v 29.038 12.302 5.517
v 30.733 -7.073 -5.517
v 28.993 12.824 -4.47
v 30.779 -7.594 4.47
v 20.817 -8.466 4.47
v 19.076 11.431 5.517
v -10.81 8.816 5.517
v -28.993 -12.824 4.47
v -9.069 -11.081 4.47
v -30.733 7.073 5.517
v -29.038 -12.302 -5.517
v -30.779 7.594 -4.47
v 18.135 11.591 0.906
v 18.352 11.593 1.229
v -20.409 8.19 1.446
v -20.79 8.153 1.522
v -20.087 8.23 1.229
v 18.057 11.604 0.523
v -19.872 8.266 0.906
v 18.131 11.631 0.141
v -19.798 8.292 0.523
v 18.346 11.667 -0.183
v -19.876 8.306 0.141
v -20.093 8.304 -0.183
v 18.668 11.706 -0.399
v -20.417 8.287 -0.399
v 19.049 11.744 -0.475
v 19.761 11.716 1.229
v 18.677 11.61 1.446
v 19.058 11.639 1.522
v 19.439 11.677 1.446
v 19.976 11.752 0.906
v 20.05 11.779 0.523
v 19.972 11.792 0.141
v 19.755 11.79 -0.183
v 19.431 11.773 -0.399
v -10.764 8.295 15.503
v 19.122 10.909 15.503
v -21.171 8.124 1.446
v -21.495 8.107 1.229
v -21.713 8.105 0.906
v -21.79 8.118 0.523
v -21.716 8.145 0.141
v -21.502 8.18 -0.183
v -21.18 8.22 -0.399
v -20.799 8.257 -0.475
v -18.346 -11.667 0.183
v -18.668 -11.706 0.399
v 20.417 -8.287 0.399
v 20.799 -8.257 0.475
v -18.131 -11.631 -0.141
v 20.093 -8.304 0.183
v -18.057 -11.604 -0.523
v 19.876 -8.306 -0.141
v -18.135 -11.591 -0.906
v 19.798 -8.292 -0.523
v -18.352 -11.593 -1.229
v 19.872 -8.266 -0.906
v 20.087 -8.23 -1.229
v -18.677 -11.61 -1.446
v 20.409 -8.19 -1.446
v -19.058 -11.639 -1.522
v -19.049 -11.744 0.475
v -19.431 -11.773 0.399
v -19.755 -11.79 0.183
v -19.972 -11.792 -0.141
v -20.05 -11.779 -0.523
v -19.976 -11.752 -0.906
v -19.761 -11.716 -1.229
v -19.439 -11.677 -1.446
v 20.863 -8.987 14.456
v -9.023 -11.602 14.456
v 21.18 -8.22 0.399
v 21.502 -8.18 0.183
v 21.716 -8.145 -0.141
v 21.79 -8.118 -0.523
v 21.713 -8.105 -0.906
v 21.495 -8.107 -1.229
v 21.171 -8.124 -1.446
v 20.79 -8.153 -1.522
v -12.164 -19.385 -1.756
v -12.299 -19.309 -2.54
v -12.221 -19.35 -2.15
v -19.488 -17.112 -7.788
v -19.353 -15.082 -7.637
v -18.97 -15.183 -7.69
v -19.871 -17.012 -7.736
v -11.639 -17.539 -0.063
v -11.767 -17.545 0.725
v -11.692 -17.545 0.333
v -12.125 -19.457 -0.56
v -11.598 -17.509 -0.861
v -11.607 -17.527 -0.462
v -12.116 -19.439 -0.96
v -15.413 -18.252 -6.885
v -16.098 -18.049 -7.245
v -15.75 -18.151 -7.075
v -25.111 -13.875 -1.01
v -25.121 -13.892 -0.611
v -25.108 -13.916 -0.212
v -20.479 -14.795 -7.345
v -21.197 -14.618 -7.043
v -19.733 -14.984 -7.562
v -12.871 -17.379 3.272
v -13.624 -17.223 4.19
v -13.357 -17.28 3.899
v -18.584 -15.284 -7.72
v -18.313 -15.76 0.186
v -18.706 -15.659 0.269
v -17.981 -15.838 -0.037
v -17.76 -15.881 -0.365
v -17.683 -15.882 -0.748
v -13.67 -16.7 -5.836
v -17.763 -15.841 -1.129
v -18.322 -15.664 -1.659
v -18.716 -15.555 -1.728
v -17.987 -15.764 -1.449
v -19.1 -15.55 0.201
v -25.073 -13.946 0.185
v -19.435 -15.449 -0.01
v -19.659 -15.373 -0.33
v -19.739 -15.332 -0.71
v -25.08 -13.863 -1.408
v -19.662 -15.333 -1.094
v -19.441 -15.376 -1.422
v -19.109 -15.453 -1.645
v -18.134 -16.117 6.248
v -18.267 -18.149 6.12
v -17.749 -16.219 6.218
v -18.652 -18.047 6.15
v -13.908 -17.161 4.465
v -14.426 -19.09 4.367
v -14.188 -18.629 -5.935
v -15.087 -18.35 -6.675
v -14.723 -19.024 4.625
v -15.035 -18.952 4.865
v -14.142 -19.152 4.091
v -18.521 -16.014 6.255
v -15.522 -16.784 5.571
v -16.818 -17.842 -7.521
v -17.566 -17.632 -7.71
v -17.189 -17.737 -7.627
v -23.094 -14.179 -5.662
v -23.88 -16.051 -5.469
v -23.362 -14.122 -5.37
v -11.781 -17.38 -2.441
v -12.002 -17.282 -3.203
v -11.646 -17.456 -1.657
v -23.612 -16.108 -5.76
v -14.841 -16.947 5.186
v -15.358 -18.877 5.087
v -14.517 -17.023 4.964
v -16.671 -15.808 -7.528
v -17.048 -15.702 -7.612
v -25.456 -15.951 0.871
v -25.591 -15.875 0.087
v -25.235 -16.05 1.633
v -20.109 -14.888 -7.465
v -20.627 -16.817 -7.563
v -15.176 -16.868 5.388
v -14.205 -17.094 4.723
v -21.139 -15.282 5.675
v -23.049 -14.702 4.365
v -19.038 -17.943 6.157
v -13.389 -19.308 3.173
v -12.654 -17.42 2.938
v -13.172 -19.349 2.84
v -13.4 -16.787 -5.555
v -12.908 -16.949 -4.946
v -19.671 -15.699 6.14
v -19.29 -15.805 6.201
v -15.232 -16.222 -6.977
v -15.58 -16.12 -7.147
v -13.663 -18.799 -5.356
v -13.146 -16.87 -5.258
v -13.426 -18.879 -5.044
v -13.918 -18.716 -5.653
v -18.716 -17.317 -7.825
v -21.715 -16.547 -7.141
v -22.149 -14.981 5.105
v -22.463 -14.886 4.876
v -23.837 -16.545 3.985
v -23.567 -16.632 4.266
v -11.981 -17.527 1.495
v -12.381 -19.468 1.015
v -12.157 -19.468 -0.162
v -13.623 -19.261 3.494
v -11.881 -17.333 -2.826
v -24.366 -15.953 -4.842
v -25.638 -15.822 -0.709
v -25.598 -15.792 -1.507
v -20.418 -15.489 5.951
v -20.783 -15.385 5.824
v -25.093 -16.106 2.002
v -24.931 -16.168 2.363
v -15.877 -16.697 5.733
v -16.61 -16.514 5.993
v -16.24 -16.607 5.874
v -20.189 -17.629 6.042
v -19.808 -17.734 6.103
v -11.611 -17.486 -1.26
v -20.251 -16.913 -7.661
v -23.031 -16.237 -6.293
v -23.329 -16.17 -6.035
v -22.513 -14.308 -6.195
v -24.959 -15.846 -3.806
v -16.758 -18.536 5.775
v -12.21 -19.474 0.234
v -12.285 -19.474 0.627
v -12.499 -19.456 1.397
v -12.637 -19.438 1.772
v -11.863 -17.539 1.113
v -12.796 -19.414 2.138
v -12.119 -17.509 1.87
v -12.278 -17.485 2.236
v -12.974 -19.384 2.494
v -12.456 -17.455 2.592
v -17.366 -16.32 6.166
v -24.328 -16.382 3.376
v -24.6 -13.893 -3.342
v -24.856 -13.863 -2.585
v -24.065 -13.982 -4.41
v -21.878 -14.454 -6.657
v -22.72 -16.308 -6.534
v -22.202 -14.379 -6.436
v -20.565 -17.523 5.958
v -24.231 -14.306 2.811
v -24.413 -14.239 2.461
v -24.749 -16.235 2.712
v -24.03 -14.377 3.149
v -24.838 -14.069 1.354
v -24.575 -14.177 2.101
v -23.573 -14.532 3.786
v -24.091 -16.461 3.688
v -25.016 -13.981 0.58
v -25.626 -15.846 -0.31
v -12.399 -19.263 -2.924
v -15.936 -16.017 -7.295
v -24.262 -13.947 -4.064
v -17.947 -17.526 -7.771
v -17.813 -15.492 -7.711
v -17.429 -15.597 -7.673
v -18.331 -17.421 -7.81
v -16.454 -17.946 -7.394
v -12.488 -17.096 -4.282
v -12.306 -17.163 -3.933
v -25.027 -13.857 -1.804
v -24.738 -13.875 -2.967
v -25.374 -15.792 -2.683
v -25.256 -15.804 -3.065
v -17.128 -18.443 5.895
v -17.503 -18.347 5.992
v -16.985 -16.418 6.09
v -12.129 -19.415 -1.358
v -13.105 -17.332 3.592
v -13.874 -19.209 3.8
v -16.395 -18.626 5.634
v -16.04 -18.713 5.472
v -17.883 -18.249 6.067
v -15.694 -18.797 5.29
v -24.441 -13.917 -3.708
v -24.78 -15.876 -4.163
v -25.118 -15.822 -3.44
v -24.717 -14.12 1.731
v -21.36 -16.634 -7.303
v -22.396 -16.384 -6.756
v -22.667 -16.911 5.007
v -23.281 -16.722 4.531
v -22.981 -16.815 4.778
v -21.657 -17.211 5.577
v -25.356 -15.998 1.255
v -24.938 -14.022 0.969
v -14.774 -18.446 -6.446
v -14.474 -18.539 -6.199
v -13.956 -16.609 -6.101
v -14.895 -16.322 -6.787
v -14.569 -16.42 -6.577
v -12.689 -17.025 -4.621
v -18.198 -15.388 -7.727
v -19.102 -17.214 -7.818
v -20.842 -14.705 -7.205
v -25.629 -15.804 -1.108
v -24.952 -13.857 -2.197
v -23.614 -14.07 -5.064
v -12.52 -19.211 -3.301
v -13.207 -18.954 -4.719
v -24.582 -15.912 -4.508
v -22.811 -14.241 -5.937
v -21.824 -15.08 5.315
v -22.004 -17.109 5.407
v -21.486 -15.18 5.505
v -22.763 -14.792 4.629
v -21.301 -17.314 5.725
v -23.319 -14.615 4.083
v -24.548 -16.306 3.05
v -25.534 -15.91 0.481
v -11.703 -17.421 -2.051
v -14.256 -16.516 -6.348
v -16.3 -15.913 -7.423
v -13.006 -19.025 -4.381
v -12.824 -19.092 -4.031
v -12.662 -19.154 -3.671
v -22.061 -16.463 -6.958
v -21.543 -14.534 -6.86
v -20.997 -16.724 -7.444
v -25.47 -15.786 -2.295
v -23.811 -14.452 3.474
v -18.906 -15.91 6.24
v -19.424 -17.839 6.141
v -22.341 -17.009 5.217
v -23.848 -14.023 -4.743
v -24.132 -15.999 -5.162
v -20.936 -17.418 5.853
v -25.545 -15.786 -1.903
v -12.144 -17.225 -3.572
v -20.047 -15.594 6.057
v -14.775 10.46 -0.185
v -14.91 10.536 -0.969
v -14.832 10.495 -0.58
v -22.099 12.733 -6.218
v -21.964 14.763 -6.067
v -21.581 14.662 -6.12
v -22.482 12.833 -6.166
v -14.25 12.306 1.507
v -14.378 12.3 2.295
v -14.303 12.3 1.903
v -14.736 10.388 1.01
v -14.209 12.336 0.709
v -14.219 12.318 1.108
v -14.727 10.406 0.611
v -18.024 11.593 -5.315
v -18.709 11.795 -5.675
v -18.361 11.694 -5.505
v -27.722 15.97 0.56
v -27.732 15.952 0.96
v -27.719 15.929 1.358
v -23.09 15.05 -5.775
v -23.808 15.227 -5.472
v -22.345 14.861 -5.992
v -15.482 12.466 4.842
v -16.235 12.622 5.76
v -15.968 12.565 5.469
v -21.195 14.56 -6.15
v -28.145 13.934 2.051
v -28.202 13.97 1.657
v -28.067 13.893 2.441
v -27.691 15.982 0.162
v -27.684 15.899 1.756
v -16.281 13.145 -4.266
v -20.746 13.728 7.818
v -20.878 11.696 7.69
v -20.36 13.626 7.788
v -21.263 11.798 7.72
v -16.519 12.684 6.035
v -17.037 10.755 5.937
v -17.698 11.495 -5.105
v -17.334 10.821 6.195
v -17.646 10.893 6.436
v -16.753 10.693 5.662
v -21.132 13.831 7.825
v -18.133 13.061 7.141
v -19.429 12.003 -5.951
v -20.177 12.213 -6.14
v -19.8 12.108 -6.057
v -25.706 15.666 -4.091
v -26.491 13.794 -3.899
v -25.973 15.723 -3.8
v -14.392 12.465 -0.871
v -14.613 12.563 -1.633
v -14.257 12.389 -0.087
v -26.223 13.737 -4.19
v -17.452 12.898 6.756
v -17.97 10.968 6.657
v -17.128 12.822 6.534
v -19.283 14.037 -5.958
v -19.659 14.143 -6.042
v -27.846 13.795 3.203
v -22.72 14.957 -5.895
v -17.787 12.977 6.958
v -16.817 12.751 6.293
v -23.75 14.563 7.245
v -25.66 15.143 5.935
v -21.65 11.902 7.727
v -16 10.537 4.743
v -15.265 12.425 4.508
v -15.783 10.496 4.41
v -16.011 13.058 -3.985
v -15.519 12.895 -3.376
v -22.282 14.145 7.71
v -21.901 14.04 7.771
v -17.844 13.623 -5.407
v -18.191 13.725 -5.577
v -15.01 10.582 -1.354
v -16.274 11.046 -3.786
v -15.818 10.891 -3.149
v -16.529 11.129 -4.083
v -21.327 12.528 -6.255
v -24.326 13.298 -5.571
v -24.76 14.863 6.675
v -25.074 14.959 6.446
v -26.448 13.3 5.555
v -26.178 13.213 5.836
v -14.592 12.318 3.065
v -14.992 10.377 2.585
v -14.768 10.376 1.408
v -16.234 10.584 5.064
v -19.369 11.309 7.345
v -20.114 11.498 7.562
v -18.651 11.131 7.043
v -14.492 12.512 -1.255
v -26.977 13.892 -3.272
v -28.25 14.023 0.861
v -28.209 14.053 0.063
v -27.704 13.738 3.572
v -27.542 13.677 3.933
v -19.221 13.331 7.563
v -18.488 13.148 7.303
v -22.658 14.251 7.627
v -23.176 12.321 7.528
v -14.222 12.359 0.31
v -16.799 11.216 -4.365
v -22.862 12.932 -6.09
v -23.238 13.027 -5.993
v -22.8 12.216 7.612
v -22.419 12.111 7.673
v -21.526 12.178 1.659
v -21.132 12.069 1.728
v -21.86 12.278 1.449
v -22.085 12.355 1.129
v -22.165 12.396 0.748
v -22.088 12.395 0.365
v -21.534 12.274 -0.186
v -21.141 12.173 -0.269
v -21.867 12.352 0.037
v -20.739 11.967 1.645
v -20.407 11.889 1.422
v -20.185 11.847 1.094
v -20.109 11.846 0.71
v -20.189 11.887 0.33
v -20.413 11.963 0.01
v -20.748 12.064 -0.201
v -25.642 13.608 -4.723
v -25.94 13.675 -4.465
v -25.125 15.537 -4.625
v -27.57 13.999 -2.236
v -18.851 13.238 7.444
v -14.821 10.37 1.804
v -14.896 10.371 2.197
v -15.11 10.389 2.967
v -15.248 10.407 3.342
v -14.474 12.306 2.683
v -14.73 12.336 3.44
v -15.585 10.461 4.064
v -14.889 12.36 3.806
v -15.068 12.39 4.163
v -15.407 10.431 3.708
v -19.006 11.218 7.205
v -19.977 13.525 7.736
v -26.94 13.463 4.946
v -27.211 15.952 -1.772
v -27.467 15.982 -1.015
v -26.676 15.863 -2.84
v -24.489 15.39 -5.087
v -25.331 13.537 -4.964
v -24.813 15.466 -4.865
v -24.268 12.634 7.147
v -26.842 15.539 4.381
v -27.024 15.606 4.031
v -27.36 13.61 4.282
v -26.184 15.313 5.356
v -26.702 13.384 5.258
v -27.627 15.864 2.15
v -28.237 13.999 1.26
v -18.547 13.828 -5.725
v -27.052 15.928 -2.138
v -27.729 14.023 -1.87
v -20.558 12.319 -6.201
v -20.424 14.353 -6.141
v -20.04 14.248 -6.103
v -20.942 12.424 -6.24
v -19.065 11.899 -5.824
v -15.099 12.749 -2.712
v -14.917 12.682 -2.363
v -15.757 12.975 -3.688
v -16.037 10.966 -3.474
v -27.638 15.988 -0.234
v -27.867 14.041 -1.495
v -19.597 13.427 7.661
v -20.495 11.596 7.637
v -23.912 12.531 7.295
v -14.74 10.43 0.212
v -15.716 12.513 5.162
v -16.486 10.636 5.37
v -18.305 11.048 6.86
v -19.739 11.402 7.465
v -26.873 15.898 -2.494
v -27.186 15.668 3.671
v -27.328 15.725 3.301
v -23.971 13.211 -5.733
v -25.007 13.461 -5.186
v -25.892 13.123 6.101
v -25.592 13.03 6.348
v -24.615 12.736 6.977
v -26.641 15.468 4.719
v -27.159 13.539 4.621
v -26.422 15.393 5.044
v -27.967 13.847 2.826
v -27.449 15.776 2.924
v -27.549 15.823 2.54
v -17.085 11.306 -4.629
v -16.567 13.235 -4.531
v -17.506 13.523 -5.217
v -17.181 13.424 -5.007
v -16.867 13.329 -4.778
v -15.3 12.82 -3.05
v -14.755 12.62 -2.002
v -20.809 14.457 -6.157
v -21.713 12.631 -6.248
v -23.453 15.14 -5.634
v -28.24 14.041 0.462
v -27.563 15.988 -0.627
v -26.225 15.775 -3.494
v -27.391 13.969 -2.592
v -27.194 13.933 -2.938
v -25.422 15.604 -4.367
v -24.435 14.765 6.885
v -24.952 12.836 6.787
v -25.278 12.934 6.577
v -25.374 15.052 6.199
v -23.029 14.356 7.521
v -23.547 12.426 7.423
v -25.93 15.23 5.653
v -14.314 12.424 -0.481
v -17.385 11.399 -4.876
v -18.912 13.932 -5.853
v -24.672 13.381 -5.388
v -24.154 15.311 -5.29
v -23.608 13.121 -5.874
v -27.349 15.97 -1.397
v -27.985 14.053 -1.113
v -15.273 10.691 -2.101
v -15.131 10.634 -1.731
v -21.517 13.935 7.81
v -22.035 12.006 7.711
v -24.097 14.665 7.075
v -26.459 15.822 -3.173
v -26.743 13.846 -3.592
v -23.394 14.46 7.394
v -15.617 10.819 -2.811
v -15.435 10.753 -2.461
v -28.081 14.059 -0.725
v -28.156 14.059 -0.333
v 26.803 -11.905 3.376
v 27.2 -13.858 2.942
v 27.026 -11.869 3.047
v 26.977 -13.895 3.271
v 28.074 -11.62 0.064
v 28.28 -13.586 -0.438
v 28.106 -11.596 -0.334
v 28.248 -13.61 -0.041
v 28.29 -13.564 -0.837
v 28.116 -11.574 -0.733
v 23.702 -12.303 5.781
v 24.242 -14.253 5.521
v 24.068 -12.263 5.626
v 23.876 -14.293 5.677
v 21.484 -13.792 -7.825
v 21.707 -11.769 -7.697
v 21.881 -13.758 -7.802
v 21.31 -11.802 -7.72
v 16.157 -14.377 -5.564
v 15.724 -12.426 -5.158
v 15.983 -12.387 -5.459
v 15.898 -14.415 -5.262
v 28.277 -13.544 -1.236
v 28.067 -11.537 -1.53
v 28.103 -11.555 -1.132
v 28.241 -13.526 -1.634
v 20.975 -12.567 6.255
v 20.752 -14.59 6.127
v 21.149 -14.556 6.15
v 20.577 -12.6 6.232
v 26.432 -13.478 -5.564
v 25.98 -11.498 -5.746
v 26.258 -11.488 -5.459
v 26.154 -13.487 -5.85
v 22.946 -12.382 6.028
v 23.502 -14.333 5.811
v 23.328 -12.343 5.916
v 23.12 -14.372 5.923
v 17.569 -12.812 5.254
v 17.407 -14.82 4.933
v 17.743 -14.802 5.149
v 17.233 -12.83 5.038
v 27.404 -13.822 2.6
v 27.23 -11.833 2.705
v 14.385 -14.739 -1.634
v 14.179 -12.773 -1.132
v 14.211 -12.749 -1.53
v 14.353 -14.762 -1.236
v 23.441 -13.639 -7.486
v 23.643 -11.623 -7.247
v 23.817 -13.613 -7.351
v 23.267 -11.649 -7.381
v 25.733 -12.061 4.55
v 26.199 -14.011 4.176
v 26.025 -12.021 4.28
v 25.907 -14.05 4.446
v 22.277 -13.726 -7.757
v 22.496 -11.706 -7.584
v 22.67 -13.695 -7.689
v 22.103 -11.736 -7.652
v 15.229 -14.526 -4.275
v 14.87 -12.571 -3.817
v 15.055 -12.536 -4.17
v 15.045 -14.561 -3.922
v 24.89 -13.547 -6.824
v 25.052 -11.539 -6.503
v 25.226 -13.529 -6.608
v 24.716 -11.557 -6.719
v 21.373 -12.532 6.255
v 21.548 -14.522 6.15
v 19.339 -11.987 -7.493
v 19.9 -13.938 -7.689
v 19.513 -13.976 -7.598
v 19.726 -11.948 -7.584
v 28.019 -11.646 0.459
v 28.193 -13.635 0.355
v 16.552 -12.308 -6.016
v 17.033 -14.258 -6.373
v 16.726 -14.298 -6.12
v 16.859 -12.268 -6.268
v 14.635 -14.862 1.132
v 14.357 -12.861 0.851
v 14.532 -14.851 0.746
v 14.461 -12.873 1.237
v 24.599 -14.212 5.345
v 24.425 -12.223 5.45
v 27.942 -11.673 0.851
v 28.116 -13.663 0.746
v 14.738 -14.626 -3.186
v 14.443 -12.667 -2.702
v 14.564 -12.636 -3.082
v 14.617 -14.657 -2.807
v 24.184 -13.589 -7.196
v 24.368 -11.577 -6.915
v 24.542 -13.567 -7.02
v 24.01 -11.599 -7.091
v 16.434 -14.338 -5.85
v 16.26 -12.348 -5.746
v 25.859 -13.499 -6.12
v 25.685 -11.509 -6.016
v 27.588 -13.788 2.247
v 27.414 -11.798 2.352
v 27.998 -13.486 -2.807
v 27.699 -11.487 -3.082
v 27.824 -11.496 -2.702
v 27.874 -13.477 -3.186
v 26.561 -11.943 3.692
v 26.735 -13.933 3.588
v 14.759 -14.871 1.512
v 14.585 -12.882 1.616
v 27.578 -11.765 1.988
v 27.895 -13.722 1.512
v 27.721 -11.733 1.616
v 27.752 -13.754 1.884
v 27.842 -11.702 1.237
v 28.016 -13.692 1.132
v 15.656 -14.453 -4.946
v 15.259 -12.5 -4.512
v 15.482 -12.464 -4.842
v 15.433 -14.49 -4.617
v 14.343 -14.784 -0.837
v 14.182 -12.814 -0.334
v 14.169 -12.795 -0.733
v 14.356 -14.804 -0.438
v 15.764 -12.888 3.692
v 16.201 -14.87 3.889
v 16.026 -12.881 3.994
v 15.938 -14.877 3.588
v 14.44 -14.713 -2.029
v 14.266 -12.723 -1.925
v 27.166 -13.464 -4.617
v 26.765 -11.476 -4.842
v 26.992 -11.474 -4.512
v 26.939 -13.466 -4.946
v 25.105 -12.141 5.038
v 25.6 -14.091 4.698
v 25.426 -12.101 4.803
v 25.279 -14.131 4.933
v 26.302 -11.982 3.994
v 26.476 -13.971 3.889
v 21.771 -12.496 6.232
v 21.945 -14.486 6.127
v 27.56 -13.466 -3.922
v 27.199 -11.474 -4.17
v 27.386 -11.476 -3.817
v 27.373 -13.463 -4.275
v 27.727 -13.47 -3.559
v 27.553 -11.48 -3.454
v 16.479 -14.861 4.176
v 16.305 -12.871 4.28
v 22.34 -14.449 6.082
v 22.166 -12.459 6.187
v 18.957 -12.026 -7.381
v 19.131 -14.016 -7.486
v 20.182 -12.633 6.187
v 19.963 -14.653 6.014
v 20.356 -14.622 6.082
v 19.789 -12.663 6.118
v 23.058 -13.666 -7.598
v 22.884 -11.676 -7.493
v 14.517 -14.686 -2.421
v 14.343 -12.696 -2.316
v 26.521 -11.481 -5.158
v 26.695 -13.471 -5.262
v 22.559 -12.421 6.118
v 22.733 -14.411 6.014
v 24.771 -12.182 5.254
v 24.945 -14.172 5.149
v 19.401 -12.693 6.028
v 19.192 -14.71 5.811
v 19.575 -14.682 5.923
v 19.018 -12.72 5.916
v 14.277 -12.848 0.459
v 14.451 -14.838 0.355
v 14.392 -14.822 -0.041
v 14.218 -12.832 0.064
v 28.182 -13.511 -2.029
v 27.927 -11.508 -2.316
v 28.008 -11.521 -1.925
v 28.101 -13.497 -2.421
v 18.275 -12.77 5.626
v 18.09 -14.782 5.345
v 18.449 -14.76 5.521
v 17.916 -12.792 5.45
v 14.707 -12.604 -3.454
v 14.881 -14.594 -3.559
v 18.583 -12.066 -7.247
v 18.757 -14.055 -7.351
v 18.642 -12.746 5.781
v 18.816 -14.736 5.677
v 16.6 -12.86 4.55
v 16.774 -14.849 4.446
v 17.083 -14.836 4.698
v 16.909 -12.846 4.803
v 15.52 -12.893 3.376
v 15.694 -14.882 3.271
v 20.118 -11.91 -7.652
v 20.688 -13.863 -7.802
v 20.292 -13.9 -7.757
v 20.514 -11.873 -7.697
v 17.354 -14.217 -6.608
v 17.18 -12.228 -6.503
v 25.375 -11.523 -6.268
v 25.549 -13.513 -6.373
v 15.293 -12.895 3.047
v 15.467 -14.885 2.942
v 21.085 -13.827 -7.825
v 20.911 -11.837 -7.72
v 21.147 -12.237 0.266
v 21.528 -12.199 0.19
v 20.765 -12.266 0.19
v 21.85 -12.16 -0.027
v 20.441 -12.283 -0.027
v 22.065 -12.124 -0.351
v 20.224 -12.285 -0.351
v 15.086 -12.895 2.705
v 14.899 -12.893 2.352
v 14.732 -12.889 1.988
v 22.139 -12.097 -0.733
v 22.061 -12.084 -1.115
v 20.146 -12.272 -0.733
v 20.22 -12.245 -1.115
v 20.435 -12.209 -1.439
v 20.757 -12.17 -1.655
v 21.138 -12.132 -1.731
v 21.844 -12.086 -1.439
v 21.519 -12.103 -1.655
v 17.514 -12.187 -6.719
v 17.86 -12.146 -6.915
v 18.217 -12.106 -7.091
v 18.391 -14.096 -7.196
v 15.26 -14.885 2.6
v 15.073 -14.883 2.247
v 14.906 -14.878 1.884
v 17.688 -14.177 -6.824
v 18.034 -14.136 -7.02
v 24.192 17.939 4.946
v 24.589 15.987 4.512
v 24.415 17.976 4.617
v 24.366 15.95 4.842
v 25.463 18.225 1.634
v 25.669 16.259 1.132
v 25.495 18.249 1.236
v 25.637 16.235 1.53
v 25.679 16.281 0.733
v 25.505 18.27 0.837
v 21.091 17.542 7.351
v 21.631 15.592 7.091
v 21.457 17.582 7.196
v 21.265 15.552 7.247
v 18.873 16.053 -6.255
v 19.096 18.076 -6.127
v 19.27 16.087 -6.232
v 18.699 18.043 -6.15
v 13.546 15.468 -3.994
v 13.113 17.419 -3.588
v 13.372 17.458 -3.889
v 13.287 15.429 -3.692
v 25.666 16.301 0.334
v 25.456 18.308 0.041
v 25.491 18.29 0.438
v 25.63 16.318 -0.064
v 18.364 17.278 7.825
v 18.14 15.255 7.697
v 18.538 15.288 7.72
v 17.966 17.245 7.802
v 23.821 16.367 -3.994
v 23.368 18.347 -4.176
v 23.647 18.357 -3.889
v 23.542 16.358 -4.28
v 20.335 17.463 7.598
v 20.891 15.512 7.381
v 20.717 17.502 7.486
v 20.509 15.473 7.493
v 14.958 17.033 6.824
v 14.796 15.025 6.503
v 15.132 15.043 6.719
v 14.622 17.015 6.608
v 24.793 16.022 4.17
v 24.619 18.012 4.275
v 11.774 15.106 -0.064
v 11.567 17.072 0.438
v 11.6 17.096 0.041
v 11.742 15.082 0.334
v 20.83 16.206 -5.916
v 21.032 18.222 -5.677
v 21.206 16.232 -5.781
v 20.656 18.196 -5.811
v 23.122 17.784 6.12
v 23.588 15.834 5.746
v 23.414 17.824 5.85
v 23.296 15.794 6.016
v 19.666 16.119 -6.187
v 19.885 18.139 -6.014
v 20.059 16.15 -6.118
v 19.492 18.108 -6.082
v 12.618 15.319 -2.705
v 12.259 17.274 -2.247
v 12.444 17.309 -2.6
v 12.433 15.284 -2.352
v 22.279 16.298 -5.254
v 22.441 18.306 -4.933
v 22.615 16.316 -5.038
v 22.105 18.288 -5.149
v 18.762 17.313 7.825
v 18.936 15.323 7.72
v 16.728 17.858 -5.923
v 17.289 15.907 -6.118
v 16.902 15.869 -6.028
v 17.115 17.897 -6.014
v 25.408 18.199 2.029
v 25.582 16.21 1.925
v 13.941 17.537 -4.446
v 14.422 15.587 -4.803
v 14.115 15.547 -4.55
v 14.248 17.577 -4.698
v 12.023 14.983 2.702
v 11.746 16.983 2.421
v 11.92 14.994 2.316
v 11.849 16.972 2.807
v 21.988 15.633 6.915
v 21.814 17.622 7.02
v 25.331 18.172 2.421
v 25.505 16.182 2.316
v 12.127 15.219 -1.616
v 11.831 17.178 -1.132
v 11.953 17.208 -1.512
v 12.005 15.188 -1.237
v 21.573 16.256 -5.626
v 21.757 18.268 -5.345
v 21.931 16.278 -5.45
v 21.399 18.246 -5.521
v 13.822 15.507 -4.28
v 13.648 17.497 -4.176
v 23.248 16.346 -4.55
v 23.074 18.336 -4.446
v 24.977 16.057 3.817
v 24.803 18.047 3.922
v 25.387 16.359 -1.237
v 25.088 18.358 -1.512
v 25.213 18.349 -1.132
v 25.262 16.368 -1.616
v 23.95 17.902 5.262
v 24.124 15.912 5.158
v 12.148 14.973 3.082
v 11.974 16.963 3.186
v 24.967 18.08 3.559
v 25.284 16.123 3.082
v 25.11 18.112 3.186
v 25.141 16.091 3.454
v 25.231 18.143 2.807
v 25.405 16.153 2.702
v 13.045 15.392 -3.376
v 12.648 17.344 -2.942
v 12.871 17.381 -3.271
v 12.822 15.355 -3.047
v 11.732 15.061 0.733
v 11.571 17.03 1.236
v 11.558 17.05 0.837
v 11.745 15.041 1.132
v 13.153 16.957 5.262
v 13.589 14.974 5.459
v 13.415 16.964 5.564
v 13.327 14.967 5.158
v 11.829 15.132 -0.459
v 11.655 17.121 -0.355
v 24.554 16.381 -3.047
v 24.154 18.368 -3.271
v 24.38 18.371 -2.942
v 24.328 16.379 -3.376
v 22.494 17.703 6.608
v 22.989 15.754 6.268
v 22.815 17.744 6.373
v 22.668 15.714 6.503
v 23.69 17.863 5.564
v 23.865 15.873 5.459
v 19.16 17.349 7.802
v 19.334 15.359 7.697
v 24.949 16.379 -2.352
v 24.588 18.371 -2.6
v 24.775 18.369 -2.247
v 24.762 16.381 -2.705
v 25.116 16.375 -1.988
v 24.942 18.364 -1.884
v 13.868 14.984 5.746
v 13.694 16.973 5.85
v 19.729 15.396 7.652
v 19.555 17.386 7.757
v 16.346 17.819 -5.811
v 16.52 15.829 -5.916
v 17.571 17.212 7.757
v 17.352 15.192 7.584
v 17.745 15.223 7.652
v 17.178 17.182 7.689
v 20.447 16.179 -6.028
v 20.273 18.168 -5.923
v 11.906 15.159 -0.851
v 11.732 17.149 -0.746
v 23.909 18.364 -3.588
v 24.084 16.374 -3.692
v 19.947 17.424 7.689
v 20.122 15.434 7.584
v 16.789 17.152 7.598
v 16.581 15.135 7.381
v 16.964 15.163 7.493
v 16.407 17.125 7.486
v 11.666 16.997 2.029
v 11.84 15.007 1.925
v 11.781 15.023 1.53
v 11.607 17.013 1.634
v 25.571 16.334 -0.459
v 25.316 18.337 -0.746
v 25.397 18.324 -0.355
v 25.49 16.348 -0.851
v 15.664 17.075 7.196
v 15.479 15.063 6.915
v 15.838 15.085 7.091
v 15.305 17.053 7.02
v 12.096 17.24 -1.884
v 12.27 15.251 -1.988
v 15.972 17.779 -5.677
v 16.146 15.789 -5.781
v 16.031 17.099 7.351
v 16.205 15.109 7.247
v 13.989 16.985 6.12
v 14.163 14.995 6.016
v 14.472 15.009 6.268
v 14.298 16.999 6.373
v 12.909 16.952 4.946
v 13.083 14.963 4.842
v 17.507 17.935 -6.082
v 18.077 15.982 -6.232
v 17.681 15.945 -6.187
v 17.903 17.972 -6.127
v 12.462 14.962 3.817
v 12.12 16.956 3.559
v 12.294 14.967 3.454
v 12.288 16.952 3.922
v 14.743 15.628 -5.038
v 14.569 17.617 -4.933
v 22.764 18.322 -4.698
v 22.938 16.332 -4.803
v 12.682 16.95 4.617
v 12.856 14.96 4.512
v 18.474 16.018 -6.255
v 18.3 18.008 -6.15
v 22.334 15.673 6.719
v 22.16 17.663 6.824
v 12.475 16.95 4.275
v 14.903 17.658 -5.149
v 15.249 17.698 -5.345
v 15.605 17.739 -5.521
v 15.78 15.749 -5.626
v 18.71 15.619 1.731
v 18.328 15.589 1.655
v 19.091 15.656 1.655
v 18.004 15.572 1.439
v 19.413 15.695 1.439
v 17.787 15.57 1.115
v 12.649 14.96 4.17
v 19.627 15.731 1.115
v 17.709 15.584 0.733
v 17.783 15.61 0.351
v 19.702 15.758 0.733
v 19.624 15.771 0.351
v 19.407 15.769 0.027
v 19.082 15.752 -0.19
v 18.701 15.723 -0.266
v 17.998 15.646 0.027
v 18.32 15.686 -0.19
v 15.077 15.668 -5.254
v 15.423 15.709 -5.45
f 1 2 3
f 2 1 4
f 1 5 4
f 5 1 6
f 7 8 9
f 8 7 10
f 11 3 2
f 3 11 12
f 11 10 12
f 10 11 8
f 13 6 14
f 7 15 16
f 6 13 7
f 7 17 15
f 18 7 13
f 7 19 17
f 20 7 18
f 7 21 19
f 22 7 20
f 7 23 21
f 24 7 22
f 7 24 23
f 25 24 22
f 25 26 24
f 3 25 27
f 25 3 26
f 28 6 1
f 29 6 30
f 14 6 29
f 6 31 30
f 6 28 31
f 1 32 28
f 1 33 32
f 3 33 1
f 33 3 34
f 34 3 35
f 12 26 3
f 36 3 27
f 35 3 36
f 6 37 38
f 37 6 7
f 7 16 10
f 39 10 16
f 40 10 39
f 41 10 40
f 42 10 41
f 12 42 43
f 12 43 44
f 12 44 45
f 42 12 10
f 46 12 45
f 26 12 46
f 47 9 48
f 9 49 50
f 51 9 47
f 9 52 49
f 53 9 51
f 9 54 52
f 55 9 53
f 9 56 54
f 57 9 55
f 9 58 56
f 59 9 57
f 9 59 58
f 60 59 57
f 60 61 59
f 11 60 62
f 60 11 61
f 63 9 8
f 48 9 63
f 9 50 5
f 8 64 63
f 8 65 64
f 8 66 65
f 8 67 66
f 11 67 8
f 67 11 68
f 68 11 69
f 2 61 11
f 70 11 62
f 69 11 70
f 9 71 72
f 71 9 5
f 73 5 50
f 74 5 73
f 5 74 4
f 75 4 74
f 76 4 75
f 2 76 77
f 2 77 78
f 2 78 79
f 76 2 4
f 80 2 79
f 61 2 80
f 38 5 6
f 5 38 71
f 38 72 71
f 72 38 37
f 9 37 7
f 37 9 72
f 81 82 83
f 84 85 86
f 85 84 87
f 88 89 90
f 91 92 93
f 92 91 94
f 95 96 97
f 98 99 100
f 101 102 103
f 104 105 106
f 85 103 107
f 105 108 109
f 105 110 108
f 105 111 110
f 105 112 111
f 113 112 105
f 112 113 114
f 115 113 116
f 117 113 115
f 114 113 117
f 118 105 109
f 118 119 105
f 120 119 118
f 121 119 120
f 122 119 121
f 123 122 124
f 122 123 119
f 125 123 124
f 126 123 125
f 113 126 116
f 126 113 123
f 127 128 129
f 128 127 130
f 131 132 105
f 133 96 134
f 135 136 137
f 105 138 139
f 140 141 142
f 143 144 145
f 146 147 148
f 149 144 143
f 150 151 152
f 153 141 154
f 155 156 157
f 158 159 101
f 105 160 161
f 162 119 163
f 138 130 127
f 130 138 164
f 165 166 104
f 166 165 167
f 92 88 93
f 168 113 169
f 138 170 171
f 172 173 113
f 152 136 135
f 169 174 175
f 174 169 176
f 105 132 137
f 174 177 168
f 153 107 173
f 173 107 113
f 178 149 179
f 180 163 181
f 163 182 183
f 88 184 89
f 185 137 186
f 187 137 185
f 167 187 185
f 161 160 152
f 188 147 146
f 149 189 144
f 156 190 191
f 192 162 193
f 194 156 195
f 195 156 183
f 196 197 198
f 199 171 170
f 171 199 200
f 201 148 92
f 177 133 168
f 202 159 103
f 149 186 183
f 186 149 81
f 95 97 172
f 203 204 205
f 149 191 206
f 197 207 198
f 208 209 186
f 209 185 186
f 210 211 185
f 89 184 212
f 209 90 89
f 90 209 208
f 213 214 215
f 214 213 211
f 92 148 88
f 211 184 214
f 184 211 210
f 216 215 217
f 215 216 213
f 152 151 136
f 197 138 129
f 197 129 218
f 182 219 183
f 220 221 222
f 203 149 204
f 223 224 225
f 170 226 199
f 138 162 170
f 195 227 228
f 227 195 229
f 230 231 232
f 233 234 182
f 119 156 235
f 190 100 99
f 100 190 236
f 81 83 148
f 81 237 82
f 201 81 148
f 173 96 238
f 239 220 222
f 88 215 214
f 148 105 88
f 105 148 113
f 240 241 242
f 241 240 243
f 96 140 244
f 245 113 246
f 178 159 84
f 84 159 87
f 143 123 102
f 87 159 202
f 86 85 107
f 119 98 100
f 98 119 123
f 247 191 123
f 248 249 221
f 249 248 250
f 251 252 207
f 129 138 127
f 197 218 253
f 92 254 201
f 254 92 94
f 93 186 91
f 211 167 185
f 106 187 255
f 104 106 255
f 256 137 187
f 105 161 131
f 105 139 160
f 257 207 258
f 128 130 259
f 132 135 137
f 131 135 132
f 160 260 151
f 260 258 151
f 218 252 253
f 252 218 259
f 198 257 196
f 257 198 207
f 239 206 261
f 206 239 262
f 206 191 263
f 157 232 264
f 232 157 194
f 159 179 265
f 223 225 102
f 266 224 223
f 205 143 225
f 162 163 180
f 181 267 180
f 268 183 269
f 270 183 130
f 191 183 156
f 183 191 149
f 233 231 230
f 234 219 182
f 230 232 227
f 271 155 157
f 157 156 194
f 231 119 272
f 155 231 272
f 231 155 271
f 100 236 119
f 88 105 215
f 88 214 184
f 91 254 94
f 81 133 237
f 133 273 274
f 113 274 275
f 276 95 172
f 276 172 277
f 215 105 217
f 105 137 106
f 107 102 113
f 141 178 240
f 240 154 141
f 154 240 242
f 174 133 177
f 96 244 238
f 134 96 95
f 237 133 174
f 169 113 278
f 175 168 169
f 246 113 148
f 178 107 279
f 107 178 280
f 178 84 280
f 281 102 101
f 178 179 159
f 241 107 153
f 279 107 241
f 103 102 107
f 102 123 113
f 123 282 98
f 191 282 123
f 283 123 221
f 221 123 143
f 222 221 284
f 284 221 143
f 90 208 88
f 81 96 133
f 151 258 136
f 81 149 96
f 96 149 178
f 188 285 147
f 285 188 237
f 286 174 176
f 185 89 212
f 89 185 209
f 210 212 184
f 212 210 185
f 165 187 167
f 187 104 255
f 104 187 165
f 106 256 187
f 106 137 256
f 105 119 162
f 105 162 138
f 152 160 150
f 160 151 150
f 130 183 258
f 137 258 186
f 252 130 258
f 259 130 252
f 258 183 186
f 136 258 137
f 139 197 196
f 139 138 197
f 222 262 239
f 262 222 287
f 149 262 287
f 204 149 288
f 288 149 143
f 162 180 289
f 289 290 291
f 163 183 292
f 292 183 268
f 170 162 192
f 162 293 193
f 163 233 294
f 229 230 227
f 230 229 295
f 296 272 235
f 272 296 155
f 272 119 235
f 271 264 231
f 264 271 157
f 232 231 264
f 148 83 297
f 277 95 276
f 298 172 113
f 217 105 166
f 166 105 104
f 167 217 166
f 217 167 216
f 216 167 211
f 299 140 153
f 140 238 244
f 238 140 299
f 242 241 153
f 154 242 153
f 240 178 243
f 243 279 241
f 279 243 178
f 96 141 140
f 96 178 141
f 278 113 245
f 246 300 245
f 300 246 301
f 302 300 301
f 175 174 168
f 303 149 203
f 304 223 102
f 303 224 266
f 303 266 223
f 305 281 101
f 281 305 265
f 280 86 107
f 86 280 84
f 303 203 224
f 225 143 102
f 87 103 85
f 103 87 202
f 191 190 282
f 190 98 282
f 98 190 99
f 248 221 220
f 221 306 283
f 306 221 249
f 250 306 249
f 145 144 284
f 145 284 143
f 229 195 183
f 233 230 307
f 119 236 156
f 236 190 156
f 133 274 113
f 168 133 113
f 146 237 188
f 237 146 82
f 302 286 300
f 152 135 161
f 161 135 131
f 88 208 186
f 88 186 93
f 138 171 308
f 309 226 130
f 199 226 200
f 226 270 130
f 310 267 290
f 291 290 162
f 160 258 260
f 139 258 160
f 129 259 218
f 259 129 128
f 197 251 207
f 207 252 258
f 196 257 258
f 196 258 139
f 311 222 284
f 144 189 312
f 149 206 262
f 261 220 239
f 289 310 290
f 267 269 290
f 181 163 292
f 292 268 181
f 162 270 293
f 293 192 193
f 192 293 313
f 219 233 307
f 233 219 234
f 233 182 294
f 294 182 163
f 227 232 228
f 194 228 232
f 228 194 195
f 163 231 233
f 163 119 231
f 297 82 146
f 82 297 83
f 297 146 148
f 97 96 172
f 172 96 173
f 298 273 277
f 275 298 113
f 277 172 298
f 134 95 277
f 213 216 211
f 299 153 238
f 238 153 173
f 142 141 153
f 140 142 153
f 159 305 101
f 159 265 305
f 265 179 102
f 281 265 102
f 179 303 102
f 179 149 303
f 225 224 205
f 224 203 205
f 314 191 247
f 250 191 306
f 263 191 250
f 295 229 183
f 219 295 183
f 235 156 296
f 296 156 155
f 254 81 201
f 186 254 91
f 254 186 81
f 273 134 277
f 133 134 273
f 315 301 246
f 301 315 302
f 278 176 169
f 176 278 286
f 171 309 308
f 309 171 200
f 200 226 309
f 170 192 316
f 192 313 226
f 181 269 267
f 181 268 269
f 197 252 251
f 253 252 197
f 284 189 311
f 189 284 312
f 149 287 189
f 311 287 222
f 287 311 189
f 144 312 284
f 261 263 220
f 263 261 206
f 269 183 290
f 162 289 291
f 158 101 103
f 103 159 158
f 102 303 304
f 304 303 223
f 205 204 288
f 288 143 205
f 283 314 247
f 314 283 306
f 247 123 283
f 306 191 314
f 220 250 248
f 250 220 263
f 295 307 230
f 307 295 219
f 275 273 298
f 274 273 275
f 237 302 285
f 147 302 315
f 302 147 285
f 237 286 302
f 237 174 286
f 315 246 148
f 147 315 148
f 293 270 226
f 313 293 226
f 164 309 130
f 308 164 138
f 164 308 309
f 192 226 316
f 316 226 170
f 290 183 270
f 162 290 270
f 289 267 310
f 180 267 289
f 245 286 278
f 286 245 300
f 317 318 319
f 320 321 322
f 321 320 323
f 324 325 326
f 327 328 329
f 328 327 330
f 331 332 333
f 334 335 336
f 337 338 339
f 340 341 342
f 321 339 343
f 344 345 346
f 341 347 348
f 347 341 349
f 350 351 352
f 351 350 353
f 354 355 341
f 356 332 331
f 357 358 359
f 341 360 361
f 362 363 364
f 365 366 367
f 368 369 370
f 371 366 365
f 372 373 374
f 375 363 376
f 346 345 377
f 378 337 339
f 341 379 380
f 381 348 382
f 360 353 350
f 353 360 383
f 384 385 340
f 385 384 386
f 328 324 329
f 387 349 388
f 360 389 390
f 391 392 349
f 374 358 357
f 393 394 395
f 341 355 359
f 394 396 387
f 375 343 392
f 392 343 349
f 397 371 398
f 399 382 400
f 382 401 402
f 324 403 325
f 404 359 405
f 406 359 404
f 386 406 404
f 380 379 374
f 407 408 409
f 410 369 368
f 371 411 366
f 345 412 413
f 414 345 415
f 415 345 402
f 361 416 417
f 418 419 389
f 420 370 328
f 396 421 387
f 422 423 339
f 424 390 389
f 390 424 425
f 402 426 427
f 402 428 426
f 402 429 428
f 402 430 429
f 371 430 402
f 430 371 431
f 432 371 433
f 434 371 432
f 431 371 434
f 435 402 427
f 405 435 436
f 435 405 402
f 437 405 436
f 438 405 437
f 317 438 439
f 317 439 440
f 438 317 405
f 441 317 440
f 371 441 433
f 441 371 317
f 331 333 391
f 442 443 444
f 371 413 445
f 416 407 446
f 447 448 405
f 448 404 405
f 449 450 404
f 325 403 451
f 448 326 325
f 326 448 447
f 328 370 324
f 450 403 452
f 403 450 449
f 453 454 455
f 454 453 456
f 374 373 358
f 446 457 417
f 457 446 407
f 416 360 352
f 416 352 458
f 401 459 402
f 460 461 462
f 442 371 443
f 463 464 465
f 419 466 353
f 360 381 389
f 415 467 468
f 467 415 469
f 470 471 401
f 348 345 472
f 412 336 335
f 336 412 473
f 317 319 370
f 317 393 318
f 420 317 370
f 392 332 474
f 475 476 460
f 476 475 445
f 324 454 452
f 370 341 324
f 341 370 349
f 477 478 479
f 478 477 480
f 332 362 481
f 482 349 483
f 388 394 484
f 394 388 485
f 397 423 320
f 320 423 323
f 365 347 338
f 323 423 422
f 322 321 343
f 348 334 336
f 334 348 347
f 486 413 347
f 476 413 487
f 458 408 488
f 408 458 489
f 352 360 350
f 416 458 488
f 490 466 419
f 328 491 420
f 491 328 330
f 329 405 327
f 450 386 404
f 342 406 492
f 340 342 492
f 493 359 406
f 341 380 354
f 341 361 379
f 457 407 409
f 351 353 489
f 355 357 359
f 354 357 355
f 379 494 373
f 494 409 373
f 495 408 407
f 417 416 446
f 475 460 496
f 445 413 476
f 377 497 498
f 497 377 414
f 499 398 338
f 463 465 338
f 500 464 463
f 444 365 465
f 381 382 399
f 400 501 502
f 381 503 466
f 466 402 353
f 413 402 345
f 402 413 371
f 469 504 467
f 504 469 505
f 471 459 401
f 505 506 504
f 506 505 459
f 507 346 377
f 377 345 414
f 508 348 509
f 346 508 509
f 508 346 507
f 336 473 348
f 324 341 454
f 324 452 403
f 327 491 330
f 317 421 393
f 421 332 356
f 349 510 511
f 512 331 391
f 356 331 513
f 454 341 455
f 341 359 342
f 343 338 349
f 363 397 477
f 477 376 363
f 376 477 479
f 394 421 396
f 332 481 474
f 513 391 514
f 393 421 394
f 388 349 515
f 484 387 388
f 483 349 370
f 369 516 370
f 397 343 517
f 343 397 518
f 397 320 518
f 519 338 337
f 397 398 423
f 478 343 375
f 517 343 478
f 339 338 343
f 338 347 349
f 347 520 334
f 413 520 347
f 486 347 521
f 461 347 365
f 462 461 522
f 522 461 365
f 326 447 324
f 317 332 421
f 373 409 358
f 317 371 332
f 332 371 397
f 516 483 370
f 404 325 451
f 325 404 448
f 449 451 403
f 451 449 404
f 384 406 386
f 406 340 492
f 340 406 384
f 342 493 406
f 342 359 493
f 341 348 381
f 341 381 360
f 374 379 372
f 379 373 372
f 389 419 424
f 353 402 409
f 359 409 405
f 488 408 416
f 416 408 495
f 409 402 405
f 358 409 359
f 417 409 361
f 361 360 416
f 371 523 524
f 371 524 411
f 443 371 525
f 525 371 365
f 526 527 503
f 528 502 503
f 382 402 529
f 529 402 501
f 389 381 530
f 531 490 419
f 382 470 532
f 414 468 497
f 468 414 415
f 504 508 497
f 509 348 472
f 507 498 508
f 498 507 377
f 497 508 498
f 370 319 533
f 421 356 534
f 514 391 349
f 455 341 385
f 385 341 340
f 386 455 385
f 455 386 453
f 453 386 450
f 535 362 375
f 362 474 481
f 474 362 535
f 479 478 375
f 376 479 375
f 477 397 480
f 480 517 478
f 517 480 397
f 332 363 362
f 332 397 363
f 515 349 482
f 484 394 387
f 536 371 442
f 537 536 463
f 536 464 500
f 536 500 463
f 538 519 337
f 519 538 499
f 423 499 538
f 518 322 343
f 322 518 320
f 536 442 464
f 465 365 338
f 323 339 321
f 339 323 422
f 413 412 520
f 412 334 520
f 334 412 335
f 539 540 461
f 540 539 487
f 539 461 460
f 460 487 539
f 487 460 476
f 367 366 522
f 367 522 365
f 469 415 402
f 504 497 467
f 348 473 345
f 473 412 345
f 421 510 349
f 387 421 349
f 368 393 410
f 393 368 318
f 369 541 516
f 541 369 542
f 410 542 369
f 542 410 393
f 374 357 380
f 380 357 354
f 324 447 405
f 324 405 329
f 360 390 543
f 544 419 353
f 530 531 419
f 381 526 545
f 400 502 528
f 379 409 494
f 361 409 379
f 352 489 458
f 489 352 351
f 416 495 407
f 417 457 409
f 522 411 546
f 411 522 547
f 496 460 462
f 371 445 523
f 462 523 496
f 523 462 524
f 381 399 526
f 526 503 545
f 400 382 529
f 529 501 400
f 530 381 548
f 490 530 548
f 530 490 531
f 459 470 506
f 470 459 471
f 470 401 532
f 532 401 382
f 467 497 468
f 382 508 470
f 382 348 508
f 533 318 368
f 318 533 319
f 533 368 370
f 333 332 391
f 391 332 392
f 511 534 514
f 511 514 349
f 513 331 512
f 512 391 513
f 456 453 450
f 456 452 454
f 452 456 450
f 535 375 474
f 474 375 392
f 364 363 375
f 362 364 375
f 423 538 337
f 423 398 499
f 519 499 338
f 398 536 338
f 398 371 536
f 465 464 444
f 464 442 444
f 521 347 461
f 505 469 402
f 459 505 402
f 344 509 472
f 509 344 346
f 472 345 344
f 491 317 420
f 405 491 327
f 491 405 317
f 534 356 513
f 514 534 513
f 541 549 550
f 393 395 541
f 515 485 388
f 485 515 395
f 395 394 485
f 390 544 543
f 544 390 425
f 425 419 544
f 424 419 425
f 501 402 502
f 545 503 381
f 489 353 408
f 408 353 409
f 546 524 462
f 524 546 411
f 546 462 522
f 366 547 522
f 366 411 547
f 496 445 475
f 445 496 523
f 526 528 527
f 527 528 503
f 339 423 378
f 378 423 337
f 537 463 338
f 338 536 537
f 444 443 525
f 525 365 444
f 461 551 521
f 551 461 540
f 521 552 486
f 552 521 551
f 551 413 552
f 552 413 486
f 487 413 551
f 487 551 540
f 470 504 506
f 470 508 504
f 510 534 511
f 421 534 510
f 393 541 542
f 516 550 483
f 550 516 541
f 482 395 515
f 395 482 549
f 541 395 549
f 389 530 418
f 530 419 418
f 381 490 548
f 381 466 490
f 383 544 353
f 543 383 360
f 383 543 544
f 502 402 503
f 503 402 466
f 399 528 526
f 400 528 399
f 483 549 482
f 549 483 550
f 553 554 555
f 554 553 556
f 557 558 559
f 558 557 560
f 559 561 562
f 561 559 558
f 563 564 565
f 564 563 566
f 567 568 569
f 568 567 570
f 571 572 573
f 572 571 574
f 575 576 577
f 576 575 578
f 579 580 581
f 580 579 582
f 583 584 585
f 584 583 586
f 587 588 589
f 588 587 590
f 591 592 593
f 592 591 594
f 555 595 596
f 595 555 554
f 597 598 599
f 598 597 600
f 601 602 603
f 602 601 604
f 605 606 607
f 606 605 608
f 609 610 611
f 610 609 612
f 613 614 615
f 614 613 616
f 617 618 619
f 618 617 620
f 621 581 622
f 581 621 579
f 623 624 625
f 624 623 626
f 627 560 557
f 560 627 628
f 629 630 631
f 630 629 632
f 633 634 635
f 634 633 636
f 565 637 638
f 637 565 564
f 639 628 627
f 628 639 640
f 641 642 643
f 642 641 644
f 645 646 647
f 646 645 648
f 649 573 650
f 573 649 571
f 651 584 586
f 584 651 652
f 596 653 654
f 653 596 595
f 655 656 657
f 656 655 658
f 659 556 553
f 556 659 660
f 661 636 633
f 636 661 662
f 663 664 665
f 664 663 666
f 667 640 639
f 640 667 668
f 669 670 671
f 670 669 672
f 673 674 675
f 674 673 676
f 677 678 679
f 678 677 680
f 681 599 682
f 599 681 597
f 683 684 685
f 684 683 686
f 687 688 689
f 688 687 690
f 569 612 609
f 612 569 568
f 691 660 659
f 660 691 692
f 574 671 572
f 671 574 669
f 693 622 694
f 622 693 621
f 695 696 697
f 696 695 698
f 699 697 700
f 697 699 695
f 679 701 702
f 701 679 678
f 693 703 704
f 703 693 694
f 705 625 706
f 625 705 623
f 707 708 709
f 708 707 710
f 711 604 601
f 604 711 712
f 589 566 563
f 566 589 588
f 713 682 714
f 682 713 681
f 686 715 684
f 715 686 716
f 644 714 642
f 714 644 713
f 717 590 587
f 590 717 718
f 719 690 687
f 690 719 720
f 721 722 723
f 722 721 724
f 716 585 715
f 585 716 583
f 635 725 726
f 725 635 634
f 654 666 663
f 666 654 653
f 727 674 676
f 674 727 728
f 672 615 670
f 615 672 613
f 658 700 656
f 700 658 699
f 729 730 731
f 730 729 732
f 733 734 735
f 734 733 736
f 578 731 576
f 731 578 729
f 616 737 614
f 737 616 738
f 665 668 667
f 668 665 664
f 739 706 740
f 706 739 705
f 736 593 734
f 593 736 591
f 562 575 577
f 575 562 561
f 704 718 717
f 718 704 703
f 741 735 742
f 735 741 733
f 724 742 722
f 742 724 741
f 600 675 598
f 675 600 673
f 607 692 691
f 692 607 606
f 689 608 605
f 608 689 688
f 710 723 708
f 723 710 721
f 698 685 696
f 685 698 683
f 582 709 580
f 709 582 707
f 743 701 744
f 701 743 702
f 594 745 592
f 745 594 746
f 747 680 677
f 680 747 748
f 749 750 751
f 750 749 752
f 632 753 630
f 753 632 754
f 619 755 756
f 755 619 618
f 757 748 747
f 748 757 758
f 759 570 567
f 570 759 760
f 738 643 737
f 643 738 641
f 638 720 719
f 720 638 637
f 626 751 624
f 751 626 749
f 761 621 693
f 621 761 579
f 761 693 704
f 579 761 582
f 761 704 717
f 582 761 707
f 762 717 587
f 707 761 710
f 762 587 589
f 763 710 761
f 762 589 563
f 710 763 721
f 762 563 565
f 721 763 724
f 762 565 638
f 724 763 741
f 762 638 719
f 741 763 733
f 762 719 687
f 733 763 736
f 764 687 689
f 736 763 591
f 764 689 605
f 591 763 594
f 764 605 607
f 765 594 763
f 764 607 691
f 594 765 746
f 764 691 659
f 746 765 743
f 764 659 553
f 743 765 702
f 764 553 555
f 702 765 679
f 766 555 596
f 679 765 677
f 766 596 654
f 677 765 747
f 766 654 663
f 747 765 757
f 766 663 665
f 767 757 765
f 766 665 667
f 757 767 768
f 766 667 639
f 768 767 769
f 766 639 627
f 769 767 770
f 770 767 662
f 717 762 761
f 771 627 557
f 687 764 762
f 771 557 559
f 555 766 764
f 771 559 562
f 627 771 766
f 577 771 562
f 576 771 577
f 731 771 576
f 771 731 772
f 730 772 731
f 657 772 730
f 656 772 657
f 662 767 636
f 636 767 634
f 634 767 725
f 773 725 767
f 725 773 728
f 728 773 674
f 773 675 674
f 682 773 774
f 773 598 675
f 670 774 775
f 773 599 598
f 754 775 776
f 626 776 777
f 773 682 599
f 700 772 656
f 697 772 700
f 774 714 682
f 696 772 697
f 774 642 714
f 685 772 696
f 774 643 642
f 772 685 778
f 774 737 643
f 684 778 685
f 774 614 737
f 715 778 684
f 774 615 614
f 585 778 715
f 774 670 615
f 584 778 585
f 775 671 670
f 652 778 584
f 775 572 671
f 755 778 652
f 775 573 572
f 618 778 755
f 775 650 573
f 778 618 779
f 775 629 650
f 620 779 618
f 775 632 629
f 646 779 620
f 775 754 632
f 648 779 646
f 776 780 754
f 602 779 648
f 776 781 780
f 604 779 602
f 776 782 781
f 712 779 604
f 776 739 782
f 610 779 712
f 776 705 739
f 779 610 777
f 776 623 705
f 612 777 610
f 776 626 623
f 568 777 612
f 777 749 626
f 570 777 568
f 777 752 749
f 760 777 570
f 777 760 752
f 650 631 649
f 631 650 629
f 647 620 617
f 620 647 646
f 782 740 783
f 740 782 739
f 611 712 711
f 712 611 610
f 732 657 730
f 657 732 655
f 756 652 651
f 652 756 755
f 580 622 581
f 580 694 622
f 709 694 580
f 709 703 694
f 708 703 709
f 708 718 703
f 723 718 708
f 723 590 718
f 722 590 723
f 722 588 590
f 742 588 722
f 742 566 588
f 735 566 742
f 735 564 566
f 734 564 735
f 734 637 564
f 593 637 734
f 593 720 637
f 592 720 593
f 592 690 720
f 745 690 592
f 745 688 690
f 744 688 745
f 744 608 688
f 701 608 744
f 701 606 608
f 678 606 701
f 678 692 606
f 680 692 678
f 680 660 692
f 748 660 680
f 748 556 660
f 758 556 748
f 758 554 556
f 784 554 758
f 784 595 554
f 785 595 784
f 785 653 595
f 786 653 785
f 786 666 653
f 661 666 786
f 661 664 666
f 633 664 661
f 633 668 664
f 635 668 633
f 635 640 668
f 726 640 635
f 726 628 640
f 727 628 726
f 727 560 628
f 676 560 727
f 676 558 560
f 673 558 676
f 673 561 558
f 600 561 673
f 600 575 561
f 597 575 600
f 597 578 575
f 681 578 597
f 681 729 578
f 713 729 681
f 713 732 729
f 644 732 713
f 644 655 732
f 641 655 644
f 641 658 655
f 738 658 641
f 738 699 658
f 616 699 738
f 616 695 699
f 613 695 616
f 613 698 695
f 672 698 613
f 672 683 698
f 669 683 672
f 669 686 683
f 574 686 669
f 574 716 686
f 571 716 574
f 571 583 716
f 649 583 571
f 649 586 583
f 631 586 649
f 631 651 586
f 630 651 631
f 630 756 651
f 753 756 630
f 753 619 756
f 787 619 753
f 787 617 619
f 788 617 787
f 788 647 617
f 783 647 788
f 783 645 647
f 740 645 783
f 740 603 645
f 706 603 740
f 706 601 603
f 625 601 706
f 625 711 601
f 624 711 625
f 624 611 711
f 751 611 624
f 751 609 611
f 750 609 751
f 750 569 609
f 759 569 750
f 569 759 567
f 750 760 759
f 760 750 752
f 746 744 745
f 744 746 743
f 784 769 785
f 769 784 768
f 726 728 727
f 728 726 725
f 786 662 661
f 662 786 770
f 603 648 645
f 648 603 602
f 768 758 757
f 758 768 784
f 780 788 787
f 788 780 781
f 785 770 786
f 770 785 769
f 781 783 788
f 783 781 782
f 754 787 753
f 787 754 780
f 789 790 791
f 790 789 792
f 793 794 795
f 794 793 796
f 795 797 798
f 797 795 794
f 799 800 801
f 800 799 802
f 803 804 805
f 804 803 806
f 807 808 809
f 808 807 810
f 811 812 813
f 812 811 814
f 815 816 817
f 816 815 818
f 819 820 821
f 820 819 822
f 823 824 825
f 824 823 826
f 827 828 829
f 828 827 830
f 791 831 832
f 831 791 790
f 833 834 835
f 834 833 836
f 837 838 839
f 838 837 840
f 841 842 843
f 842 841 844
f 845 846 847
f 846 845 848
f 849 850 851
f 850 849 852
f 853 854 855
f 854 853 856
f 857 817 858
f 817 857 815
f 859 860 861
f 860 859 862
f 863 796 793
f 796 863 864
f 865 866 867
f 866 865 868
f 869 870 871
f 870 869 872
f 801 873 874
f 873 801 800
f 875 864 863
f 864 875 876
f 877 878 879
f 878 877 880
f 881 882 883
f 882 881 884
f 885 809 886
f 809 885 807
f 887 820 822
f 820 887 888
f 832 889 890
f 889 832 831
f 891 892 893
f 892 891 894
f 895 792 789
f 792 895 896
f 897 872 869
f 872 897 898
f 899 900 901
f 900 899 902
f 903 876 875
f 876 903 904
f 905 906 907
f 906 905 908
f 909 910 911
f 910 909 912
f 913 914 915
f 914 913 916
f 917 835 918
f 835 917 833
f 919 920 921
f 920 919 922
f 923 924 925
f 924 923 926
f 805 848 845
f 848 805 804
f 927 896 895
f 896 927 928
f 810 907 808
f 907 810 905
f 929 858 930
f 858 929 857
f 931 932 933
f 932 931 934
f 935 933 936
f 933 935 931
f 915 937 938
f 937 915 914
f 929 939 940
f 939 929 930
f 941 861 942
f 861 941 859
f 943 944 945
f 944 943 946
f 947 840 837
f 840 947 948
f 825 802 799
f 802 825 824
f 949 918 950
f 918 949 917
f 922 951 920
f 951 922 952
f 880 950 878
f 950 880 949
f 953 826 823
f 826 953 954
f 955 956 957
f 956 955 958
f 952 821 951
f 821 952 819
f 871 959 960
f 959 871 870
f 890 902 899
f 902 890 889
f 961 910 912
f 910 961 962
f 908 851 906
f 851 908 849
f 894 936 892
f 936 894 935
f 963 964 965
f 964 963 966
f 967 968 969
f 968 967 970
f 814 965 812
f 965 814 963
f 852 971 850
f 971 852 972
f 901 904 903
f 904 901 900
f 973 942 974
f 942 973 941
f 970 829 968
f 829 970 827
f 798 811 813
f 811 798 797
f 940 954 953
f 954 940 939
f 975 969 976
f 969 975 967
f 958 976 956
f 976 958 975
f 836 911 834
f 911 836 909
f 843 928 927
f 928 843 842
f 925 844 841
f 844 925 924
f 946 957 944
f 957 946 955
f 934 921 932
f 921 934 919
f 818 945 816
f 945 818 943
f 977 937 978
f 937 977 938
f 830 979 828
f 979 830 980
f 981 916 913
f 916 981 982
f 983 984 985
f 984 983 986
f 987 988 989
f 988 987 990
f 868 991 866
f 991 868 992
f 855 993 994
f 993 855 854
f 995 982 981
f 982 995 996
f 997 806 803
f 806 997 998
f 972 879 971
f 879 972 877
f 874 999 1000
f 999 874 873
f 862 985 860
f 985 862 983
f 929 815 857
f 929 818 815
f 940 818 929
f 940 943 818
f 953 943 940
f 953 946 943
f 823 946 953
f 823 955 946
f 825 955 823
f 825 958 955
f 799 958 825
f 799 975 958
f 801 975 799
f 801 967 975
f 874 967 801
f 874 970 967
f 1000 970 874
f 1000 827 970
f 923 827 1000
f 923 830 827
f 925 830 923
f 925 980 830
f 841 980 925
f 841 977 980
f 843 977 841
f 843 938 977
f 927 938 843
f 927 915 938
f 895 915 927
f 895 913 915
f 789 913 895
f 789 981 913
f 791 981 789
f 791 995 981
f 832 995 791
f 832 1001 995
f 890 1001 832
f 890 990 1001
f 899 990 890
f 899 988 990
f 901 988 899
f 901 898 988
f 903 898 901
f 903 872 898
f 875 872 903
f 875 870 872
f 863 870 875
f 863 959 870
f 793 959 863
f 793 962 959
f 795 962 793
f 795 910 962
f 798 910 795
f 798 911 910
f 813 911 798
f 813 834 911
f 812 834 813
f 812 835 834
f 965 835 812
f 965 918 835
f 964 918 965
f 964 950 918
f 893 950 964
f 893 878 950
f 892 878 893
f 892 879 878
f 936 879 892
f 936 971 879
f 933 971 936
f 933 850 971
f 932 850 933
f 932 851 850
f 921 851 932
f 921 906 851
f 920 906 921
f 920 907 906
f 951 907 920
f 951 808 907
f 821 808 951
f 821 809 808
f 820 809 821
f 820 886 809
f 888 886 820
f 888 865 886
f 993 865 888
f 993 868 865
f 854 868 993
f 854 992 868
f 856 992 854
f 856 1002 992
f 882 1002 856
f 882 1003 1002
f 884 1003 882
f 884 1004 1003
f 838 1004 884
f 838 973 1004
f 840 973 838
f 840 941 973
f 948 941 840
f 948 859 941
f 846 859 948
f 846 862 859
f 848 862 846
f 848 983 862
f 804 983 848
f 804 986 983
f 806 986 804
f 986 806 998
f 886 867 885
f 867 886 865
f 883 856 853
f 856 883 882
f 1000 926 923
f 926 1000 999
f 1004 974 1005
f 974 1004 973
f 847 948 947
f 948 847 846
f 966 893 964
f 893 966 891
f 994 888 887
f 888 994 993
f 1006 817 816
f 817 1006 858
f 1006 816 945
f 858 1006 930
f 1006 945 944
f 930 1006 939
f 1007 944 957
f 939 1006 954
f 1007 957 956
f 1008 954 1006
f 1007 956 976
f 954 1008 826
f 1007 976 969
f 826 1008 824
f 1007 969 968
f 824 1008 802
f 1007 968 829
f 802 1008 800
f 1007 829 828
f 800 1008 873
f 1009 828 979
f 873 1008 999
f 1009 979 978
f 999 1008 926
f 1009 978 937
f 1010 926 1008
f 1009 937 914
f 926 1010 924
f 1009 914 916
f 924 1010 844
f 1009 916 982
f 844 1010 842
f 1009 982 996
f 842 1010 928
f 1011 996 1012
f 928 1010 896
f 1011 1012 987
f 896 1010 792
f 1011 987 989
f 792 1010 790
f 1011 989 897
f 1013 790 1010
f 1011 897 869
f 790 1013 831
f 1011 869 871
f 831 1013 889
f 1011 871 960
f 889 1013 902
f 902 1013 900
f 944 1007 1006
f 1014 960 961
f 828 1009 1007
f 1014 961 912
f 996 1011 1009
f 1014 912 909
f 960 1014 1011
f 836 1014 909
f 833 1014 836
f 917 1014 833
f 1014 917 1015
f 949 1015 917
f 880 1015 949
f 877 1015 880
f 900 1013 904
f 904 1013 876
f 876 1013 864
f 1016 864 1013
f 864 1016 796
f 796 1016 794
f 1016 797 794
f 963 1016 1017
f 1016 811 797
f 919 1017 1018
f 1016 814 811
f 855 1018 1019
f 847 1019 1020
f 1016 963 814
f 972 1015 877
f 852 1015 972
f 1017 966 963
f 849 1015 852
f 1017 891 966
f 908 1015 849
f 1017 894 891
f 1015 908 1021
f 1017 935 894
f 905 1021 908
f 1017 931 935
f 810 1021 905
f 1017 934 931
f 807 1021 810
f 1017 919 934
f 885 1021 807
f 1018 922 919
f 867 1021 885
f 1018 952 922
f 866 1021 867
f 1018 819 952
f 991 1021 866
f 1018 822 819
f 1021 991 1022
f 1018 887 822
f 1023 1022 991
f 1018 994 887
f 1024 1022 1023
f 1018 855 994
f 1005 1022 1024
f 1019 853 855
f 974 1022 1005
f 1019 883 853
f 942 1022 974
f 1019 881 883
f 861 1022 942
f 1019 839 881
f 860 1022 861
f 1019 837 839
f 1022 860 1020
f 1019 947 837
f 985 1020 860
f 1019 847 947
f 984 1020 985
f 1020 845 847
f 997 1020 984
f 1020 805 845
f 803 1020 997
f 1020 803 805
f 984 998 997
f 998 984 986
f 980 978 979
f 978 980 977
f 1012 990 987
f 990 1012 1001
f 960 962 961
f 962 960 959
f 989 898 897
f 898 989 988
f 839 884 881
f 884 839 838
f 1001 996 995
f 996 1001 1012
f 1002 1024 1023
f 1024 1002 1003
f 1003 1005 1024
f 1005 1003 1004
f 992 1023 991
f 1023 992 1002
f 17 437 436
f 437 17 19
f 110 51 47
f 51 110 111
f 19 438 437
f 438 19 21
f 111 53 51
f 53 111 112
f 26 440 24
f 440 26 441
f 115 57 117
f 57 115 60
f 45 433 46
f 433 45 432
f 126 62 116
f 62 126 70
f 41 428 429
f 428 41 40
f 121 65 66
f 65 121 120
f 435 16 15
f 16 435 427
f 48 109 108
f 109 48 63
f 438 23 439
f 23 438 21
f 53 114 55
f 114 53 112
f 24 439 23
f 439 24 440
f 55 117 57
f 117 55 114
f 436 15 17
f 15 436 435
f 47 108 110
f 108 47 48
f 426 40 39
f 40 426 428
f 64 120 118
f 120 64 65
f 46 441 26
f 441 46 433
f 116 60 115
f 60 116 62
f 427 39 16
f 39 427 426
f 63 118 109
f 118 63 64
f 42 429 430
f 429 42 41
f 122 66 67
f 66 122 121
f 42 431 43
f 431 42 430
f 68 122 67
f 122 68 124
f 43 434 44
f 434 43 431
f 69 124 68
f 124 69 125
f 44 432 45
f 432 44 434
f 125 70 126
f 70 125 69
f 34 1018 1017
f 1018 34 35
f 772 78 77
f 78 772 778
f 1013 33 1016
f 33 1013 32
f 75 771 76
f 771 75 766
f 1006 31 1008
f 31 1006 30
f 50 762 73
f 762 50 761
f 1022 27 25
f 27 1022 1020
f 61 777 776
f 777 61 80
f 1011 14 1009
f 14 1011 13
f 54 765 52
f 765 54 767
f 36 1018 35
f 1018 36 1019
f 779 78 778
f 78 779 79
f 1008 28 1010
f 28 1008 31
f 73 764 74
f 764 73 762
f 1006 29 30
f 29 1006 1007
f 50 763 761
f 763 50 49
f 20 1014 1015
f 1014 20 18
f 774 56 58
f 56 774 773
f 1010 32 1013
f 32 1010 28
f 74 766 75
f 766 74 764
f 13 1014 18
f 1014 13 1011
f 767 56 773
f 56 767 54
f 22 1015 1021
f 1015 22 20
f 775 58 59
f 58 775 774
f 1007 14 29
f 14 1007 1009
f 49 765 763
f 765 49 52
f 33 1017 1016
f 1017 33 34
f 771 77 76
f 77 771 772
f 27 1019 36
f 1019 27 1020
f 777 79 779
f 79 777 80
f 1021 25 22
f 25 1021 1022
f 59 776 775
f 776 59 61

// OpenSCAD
$fa = 1;
$fs = 0.4;

body_width = 20;
wheel_radius = 7;
wheel_width = 2;
axle_length = body_width + 10;
axle_position = 20;

// Car body
rotate([3, 0, 5]) {
    cube([60, body_width ,10], center=true);
translate([5, 0, 10]) 
    cube([30, body_width, 10], center=true);
// Merging cubes to join the first two together
translate([5, 0, 10 - 0.001]) 
    cube([30, body_width, 0.002], center=true);


// Wheels
// Operations are applied from the one closest to the object definition (create cylinder -> rotation -> translation)
wheel_dx = axle_length / 2;
translate([-axle_position, -wheel_dx, 0]) 
    rotate([90, 0, -20]) 
    cylinder(h=wheel_width, r=wheel_radius, center=true);
translate([-axle_position, wheel_dx, 0]) 
    rotate([90, 0, -20]) 
    cylinder(h=wheel_width, r=wheel_radius, center=true);
translate([axle_position, -wheel_dx, 0]) 
    rotate([90, 0, 0]) 
    cylinder(h=wheel_width, r=wheel_radius, center=true);
translate([axle_position, wheel_dx, 0]) 
    rotate([90, 0, 0]) 
    cylinder(h=wheel_width, r=wheel_radius, center=true);

// Wheel axles
translate([-axle_position, 0, 0]) 
    rotate([90, 0, 0]) 
    cylinder(h=axle_length, r=1, center=true);
translate([axle_position, 0, 0]) 
    rotate([90, 0, 0])
    cylinder(h=axle_length, r=1, center=true);
}
